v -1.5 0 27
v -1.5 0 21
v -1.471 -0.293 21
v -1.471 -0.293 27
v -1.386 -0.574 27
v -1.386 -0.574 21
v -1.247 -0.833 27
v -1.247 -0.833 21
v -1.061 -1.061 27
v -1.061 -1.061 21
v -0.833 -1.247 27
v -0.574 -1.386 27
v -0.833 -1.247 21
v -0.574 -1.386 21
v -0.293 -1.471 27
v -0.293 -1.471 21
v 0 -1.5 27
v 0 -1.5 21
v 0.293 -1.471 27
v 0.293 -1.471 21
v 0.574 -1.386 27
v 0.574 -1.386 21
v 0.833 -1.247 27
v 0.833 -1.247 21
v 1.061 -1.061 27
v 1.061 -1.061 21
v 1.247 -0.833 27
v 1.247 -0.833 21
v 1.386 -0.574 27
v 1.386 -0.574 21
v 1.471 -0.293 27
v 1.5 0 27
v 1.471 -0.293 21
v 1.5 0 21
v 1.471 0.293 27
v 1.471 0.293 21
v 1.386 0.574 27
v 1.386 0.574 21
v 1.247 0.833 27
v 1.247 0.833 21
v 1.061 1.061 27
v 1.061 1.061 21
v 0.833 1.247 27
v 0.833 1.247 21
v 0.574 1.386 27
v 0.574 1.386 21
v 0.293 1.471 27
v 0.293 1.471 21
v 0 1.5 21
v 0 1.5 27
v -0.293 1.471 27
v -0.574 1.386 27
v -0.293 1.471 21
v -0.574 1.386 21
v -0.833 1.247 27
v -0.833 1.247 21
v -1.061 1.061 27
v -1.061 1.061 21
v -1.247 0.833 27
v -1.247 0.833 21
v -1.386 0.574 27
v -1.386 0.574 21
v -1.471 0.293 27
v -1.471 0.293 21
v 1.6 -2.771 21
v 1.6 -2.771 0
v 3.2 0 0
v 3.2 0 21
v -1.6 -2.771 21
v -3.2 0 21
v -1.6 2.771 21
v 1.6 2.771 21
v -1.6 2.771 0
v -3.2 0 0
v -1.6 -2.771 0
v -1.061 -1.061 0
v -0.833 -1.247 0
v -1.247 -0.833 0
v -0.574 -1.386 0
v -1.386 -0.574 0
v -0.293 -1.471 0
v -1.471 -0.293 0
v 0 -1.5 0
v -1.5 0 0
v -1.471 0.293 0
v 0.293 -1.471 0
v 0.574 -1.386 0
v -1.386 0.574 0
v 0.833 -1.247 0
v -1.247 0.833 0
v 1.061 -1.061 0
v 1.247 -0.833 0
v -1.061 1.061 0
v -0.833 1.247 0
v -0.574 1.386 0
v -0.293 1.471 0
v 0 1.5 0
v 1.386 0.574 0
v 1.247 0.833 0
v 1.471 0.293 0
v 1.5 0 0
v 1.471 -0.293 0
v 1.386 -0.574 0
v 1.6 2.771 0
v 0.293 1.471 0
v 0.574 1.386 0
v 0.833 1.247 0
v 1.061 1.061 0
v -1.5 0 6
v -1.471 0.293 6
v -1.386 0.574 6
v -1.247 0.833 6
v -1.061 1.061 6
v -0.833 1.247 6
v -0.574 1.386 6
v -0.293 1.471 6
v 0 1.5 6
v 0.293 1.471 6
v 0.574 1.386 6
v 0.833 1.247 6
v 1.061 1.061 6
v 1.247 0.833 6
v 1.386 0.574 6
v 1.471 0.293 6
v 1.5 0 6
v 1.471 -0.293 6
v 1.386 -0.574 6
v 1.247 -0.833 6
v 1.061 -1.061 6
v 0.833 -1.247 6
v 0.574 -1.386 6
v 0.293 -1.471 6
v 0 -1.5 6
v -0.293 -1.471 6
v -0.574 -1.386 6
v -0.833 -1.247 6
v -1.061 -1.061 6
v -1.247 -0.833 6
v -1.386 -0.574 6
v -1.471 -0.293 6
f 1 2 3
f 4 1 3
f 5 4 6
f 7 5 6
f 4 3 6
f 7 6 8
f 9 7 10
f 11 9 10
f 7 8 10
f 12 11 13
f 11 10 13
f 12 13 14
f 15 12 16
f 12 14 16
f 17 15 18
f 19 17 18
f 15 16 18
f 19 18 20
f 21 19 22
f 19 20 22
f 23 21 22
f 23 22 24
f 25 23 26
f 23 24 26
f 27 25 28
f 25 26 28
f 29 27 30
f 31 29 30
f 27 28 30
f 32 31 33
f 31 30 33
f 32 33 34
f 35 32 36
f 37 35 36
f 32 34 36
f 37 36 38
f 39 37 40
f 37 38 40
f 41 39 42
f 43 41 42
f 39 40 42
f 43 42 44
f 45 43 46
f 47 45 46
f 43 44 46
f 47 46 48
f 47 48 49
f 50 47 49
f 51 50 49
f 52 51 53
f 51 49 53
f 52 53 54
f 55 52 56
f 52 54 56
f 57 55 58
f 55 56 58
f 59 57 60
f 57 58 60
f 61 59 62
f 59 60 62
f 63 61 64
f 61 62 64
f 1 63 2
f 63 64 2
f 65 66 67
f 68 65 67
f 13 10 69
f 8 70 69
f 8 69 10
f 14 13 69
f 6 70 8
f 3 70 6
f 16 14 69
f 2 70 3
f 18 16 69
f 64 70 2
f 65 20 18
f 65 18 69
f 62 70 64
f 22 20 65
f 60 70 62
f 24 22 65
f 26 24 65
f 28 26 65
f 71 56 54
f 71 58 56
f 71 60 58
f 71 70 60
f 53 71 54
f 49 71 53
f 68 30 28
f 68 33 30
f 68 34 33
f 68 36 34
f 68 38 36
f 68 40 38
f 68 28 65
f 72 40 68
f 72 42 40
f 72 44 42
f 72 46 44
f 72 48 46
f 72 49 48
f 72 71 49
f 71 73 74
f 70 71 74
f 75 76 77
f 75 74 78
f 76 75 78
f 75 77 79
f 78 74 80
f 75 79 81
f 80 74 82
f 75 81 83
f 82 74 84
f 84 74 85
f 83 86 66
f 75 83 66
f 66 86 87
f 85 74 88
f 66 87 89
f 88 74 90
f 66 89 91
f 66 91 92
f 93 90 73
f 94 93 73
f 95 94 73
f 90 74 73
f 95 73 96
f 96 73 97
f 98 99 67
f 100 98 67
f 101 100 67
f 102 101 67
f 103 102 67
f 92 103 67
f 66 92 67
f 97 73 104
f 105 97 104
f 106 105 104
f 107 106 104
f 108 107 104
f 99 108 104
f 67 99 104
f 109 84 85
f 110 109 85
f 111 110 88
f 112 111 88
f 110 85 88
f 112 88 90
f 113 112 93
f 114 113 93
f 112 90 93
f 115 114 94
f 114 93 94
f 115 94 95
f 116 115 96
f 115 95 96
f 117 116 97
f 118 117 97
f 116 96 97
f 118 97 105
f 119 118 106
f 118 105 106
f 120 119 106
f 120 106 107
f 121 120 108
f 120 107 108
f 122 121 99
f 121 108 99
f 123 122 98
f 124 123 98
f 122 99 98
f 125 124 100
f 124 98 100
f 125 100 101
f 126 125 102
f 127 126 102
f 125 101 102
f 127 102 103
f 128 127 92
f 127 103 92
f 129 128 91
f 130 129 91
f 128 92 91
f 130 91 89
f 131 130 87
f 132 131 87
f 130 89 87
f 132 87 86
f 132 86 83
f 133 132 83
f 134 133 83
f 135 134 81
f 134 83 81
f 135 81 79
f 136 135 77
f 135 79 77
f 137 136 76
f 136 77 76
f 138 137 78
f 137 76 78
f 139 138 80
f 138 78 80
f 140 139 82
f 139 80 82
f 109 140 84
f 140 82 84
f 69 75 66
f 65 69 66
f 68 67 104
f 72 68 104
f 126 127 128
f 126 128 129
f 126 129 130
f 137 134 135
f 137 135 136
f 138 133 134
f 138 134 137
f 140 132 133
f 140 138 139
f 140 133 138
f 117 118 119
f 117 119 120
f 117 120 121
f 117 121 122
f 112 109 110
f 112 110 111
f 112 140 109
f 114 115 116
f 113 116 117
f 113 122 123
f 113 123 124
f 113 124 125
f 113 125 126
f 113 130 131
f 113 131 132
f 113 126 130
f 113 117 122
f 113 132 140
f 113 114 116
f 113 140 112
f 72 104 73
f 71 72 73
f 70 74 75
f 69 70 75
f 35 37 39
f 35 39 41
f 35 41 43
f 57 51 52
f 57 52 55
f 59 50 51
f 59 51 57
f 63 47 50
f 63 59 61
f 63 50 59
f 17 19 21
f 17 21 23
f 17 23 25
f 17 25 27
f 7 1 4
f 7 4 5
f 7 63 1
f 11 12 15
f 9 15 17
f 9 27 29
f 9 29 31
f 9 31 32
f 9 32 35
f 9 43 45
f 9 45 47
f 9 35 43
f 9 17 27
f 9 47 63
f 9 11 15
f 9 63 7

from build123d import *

# Parameters (mm, degrees)
EXTRUDE_1_DEPTH     = 21
SKETCH_4_R          = 1.5
CUT_EXTRUDE_1_DEPTH = 6
SKETCH_5_R          = 1.5
EXTRUDE_2_DEPTH     = 6


with BuildPart() as part:
    # 草图3 → 凸台-拉伸1 (new body)
    with BuildSketch(Plane.XY):
        Polygon((1.6, 2.771281292), (-1.6, 2.771281292), (-3.2, 0), (-1.6, -2.771281292), (1.6, -2.771281292), (3.2, 0), align=None)
    extrude(amount=EXTRUDE_1_DEPTH)

    # 草图4 → 切除-拉伸1 (cut)
    with BuildSketch(Plane(origin=(0, 0, 0), x_dir=(-1, 0, 0), z_dir=(0, 0, -1))):
        Circle(SKETCH_4_R)
    extrude(amount=-CUT_EXTRUDE_1_DEPTH, mode=Mode.SUBTRACT)

    # 草图5 → 凸台-拉伸2 (add)
    with BuildSketch(Plane.XY.offset(21)):
        with Locations(Location((0, 0, 0), (0, 0, 180))):
            Circle(SKETCH_5_R)
    extrude(amount=EXTRUDE_2_DEPTH)


solid = part.part
